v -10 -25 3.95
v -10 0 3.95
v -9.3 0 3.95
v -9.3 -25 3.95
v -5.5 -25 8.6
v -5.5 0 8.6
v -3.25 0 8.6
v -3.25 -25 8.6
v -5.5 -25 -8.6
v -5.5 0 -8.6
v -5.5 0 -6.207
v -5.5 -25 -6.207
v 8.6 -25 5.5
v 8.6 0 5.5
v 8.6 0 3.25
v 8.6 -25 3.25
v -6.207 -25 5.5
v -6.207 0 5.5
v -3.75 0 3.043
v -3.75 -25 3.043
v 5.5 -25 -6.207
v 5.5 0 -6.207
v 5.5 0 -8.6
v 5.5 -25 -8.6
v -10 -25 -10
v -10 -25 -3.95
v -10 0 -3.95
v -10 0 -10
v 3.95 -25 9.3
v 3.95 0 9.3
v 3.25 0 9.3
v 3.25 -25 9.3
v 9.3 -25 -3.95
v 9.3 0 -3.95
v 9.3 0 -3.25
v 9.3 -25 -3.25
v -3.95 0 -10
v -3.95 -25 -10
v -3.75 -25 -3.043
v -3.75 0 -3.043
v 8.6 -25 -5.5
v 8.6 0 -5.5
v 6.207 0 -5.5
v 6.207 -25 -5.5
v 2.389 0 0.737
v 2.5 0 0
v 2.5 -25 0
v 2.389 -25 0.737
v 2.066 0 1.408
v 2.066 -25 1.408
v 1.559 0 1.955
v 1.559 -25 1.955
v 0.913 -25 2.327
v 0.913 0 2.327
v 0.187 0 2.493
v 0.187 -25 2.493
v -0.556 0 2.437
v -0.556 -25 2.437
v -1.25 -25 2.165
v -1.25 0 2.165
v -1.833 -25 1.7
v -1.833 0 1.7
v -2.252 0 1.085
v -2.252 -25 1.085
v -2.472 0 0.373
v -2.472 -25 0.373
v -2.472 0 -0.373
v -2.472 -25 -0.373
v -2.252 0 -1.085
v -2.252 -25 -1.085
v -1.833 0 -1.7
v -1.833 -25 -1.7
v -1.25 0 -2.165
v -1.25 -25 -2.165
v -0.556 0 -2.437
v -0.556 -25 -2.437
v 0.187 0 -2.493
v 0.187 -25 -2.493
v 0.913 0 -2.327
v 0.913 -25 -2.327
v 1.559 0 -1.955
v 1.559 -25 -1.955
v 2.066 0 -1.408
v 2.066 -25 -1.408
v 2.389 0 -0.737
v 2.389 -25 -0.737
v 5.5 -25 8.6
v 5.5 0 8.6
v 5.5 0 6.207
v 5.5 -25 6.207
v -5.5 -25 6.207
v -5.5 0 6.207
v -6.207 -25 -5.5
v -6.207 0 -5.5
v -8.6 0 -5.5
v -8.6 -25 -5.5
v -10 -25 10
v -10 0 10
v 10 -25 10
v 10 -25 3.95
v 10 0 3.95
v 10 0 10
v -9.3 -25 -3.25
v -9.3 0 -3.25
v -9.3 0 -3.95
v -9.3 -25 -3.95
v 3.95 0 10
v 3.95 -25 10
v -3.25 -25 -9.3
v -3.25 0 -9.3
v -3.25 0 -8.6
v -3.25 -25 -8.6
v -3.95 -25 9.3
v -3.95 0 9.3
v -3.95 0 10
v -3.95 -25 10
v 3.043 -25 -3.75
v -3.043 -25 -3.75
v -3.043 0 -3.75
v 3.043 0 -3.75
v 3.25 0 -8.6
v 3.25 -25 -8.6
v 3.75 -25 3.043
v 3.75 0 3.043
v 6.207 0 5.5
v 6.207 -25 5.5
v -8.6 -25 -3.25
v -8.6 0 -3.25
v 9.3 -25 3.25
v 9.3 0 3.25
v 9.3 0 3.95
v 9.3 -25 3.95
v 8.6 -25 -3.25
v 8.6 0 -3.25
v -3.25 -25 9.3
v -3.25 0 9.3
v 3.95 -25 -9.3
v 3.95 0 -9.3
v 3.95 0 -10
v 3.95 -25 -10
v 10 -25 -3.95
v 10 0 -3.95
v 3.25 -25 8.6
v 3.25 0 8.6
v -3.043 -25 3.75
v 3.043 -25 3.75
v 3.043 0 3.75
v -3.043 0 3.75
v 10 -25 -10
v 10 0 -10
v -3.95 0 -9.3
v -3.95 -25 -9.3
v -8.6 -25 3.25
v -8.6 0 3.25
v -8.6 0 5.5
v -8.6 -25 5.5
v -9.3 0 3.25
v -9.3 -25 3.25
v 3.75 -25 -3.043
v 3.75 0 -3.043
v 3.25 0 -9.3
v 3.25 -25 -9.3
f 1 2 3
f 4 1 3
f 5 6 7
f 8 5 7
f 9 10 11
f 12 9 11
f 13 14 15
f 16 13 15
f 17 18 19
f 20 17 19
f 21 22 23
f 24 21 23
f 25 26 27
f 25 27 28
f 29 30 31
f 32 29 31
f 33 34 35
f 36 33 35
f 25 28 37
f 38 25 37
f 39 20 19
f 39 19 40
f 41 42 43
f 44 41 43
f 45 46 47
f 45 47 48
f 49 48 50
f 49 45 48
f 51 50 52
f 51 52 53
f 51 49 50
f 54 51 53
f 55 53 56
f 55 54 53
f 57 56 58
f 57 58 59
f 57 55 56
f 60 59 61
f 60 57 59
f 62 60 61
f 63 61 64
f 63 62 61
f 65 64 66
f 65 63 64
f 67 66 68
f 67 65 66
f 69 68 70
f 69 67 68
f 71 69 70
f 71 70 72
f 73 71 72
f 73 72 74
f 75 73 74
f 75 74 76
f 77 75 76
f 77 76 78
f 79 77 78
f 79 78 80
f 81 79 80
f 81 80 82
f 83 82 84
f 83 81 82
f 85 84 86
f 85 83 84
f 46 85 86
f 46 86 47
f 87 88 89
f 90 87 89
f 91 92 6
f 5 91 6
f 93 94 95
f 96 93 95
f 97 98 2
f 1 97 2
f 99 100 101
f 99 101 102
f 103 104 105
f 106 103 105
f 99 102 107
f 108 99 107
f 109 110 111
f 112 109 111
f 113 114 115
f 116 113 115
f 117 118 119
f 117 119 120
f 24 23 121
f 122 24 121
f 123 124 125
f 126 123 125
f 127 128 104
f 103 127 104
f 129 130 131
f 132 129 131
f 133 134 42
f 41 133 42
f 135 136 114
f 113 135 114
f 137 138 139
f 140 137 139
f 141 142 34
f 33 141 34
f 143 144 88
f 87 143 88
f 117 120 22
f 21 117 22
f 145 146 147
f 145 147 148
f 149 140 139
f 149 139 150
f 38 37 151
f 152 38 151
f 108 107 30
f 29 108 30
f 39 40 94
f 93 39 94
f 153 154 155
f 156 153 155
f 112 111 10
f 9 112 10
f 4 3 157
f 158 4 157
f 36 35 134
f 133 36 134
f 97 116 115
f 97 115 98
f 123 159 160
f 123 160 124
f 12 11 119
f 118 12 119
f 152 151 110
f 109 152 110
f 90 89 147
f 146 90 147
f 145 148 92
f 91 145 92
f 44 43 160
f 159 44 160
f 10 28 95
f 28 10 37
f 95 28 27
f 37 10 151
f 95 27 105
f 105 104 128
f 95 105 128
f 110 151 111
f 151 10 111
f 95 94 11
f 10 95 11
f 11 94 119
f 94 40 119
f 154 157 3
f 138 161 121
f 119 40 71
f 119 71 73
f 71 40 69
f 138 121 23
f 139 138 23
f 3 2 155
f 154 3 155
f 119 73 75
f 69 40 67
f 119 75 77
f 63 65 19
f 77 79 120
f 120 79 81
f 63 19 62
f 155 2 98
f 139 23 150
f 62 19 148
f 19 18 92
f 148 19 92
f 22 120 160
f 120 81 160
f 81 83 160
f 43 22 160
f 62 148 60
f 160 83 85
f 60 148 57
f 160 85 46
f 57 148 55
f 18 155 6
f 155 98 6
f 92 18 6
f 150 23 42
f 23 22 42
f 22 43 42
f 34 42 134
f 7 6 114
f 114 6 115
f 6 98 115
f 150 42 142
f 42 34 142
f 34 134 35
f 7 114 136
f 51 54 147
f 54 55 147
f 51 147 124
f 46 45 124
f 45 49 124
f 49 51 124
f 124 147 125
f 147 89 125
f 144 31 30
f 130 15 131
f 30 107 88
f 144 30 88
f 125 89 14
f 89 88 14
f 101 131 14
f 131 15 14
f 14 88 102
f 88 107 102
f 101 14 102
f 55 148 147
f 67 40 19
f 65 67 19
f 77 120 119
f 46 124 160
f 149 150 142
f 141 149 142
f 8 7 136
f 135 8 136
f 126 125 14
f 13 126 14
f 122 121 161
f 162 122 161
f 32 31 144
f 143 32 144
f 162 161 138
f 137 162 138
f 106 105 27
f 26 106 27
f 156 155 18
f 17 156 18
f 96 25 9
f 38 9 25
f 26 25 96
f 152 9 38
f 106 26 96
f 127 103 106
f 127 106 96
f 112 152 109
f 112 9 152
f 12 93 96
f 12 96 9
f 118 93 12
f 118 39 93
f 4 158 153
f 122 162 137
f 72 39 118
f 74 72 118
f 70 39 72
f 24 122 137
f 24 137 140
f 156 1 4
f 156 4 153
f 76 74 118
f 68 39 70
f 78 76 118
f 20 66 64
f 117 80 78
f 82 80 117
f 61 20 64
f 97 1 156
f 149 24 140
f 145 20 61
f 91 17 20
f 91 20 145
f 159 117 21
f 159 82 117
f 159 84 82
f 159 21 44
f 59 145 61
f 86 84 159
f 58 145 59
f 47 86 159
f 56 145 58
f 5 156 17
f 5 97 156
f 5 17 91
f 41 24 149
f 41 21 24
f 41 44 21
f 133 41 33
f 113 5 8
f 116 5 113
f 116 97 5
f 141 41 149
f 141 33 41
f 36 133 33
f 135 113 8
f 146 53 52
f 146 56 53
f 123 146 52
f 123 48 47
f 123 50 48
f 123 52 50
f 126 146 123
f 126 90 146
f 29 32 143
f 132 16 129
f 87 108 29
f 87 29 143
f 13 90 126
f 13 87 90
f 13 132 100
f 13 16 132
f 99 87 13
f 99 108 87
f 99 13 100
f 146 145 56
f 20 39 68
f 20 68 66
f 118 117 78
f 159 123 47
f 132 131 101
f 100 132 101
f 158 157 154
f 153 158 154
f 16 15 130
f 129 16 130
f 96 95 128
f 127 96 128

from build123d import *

# Parameters (mm, degrees)
F0_R     = 2.5
F1_DEPTH = 25


with BuildPart() as f1:
    # F0 (on Front) → F1 (new body)
    with BuildSketch(Plane.XZ):
        Polygon((10, 3.95), (10, 10), (3.95, 10), (3.95, 9.3), (3.25, 9.3), (3.25, 8.6), (5.5, 8.6), (5.5, 6.207107), (3.042893, 3.75), (0, 3.75), (-3.042893, 3.75), (-5.5, 6.207107), (-5.5, 8.6), (-3.25, 8.6), (-3.25, 9.3), (-3.95, 9.3), (-3.95, 10), (-10, 10), (-10, 3.95), (-9.3, 3.95), (-9.3, 3.25), (-8.6, 3.25), (-8.6, 5.5), (-6.207107, 5.5), (-3.75, 3.042893), (-3.75, 0), (-3.75, -3.042893), (-6.207107, -5.5), (-8.6, -5.5), (-8.6, -3.25), (-9.3, -3.25), (-9.3, -3.95), (-10, -3.95), (-10, -10), (-3.95, -10), (-3.95, -9.3), (-3.25, -9.3), (-3.25, -8.6), (-5.5, -8.6), (-5.5, -6.207107), (-3.042893, -3.75), (0, -3.75), (3.042893, -3.75), (5.5, -6.207107), (5.5, -8.6), (3.25, -8.6), (3.25, -9.3), (3.95, -9.3), (3.95, -10), (10, -10), (10, -3.95), (9.3, -3.95), (9.3, -3.25), (8.6, -3.25), (8.6, -5.5), (6.207107, -5.5), (3.75, -3.042893), (3.75, 0), (3.75, 3.042893), (6.207107, 5.5), (8.6, 5.5), (8.6, 3.25), (9.3, 3.25), (9.3, 3.95), align=None)
        Circle(F0_R, mode=Mode.SUBTRACT)
    extrude(amount=F1_DEPTH)


solid = f1.part
